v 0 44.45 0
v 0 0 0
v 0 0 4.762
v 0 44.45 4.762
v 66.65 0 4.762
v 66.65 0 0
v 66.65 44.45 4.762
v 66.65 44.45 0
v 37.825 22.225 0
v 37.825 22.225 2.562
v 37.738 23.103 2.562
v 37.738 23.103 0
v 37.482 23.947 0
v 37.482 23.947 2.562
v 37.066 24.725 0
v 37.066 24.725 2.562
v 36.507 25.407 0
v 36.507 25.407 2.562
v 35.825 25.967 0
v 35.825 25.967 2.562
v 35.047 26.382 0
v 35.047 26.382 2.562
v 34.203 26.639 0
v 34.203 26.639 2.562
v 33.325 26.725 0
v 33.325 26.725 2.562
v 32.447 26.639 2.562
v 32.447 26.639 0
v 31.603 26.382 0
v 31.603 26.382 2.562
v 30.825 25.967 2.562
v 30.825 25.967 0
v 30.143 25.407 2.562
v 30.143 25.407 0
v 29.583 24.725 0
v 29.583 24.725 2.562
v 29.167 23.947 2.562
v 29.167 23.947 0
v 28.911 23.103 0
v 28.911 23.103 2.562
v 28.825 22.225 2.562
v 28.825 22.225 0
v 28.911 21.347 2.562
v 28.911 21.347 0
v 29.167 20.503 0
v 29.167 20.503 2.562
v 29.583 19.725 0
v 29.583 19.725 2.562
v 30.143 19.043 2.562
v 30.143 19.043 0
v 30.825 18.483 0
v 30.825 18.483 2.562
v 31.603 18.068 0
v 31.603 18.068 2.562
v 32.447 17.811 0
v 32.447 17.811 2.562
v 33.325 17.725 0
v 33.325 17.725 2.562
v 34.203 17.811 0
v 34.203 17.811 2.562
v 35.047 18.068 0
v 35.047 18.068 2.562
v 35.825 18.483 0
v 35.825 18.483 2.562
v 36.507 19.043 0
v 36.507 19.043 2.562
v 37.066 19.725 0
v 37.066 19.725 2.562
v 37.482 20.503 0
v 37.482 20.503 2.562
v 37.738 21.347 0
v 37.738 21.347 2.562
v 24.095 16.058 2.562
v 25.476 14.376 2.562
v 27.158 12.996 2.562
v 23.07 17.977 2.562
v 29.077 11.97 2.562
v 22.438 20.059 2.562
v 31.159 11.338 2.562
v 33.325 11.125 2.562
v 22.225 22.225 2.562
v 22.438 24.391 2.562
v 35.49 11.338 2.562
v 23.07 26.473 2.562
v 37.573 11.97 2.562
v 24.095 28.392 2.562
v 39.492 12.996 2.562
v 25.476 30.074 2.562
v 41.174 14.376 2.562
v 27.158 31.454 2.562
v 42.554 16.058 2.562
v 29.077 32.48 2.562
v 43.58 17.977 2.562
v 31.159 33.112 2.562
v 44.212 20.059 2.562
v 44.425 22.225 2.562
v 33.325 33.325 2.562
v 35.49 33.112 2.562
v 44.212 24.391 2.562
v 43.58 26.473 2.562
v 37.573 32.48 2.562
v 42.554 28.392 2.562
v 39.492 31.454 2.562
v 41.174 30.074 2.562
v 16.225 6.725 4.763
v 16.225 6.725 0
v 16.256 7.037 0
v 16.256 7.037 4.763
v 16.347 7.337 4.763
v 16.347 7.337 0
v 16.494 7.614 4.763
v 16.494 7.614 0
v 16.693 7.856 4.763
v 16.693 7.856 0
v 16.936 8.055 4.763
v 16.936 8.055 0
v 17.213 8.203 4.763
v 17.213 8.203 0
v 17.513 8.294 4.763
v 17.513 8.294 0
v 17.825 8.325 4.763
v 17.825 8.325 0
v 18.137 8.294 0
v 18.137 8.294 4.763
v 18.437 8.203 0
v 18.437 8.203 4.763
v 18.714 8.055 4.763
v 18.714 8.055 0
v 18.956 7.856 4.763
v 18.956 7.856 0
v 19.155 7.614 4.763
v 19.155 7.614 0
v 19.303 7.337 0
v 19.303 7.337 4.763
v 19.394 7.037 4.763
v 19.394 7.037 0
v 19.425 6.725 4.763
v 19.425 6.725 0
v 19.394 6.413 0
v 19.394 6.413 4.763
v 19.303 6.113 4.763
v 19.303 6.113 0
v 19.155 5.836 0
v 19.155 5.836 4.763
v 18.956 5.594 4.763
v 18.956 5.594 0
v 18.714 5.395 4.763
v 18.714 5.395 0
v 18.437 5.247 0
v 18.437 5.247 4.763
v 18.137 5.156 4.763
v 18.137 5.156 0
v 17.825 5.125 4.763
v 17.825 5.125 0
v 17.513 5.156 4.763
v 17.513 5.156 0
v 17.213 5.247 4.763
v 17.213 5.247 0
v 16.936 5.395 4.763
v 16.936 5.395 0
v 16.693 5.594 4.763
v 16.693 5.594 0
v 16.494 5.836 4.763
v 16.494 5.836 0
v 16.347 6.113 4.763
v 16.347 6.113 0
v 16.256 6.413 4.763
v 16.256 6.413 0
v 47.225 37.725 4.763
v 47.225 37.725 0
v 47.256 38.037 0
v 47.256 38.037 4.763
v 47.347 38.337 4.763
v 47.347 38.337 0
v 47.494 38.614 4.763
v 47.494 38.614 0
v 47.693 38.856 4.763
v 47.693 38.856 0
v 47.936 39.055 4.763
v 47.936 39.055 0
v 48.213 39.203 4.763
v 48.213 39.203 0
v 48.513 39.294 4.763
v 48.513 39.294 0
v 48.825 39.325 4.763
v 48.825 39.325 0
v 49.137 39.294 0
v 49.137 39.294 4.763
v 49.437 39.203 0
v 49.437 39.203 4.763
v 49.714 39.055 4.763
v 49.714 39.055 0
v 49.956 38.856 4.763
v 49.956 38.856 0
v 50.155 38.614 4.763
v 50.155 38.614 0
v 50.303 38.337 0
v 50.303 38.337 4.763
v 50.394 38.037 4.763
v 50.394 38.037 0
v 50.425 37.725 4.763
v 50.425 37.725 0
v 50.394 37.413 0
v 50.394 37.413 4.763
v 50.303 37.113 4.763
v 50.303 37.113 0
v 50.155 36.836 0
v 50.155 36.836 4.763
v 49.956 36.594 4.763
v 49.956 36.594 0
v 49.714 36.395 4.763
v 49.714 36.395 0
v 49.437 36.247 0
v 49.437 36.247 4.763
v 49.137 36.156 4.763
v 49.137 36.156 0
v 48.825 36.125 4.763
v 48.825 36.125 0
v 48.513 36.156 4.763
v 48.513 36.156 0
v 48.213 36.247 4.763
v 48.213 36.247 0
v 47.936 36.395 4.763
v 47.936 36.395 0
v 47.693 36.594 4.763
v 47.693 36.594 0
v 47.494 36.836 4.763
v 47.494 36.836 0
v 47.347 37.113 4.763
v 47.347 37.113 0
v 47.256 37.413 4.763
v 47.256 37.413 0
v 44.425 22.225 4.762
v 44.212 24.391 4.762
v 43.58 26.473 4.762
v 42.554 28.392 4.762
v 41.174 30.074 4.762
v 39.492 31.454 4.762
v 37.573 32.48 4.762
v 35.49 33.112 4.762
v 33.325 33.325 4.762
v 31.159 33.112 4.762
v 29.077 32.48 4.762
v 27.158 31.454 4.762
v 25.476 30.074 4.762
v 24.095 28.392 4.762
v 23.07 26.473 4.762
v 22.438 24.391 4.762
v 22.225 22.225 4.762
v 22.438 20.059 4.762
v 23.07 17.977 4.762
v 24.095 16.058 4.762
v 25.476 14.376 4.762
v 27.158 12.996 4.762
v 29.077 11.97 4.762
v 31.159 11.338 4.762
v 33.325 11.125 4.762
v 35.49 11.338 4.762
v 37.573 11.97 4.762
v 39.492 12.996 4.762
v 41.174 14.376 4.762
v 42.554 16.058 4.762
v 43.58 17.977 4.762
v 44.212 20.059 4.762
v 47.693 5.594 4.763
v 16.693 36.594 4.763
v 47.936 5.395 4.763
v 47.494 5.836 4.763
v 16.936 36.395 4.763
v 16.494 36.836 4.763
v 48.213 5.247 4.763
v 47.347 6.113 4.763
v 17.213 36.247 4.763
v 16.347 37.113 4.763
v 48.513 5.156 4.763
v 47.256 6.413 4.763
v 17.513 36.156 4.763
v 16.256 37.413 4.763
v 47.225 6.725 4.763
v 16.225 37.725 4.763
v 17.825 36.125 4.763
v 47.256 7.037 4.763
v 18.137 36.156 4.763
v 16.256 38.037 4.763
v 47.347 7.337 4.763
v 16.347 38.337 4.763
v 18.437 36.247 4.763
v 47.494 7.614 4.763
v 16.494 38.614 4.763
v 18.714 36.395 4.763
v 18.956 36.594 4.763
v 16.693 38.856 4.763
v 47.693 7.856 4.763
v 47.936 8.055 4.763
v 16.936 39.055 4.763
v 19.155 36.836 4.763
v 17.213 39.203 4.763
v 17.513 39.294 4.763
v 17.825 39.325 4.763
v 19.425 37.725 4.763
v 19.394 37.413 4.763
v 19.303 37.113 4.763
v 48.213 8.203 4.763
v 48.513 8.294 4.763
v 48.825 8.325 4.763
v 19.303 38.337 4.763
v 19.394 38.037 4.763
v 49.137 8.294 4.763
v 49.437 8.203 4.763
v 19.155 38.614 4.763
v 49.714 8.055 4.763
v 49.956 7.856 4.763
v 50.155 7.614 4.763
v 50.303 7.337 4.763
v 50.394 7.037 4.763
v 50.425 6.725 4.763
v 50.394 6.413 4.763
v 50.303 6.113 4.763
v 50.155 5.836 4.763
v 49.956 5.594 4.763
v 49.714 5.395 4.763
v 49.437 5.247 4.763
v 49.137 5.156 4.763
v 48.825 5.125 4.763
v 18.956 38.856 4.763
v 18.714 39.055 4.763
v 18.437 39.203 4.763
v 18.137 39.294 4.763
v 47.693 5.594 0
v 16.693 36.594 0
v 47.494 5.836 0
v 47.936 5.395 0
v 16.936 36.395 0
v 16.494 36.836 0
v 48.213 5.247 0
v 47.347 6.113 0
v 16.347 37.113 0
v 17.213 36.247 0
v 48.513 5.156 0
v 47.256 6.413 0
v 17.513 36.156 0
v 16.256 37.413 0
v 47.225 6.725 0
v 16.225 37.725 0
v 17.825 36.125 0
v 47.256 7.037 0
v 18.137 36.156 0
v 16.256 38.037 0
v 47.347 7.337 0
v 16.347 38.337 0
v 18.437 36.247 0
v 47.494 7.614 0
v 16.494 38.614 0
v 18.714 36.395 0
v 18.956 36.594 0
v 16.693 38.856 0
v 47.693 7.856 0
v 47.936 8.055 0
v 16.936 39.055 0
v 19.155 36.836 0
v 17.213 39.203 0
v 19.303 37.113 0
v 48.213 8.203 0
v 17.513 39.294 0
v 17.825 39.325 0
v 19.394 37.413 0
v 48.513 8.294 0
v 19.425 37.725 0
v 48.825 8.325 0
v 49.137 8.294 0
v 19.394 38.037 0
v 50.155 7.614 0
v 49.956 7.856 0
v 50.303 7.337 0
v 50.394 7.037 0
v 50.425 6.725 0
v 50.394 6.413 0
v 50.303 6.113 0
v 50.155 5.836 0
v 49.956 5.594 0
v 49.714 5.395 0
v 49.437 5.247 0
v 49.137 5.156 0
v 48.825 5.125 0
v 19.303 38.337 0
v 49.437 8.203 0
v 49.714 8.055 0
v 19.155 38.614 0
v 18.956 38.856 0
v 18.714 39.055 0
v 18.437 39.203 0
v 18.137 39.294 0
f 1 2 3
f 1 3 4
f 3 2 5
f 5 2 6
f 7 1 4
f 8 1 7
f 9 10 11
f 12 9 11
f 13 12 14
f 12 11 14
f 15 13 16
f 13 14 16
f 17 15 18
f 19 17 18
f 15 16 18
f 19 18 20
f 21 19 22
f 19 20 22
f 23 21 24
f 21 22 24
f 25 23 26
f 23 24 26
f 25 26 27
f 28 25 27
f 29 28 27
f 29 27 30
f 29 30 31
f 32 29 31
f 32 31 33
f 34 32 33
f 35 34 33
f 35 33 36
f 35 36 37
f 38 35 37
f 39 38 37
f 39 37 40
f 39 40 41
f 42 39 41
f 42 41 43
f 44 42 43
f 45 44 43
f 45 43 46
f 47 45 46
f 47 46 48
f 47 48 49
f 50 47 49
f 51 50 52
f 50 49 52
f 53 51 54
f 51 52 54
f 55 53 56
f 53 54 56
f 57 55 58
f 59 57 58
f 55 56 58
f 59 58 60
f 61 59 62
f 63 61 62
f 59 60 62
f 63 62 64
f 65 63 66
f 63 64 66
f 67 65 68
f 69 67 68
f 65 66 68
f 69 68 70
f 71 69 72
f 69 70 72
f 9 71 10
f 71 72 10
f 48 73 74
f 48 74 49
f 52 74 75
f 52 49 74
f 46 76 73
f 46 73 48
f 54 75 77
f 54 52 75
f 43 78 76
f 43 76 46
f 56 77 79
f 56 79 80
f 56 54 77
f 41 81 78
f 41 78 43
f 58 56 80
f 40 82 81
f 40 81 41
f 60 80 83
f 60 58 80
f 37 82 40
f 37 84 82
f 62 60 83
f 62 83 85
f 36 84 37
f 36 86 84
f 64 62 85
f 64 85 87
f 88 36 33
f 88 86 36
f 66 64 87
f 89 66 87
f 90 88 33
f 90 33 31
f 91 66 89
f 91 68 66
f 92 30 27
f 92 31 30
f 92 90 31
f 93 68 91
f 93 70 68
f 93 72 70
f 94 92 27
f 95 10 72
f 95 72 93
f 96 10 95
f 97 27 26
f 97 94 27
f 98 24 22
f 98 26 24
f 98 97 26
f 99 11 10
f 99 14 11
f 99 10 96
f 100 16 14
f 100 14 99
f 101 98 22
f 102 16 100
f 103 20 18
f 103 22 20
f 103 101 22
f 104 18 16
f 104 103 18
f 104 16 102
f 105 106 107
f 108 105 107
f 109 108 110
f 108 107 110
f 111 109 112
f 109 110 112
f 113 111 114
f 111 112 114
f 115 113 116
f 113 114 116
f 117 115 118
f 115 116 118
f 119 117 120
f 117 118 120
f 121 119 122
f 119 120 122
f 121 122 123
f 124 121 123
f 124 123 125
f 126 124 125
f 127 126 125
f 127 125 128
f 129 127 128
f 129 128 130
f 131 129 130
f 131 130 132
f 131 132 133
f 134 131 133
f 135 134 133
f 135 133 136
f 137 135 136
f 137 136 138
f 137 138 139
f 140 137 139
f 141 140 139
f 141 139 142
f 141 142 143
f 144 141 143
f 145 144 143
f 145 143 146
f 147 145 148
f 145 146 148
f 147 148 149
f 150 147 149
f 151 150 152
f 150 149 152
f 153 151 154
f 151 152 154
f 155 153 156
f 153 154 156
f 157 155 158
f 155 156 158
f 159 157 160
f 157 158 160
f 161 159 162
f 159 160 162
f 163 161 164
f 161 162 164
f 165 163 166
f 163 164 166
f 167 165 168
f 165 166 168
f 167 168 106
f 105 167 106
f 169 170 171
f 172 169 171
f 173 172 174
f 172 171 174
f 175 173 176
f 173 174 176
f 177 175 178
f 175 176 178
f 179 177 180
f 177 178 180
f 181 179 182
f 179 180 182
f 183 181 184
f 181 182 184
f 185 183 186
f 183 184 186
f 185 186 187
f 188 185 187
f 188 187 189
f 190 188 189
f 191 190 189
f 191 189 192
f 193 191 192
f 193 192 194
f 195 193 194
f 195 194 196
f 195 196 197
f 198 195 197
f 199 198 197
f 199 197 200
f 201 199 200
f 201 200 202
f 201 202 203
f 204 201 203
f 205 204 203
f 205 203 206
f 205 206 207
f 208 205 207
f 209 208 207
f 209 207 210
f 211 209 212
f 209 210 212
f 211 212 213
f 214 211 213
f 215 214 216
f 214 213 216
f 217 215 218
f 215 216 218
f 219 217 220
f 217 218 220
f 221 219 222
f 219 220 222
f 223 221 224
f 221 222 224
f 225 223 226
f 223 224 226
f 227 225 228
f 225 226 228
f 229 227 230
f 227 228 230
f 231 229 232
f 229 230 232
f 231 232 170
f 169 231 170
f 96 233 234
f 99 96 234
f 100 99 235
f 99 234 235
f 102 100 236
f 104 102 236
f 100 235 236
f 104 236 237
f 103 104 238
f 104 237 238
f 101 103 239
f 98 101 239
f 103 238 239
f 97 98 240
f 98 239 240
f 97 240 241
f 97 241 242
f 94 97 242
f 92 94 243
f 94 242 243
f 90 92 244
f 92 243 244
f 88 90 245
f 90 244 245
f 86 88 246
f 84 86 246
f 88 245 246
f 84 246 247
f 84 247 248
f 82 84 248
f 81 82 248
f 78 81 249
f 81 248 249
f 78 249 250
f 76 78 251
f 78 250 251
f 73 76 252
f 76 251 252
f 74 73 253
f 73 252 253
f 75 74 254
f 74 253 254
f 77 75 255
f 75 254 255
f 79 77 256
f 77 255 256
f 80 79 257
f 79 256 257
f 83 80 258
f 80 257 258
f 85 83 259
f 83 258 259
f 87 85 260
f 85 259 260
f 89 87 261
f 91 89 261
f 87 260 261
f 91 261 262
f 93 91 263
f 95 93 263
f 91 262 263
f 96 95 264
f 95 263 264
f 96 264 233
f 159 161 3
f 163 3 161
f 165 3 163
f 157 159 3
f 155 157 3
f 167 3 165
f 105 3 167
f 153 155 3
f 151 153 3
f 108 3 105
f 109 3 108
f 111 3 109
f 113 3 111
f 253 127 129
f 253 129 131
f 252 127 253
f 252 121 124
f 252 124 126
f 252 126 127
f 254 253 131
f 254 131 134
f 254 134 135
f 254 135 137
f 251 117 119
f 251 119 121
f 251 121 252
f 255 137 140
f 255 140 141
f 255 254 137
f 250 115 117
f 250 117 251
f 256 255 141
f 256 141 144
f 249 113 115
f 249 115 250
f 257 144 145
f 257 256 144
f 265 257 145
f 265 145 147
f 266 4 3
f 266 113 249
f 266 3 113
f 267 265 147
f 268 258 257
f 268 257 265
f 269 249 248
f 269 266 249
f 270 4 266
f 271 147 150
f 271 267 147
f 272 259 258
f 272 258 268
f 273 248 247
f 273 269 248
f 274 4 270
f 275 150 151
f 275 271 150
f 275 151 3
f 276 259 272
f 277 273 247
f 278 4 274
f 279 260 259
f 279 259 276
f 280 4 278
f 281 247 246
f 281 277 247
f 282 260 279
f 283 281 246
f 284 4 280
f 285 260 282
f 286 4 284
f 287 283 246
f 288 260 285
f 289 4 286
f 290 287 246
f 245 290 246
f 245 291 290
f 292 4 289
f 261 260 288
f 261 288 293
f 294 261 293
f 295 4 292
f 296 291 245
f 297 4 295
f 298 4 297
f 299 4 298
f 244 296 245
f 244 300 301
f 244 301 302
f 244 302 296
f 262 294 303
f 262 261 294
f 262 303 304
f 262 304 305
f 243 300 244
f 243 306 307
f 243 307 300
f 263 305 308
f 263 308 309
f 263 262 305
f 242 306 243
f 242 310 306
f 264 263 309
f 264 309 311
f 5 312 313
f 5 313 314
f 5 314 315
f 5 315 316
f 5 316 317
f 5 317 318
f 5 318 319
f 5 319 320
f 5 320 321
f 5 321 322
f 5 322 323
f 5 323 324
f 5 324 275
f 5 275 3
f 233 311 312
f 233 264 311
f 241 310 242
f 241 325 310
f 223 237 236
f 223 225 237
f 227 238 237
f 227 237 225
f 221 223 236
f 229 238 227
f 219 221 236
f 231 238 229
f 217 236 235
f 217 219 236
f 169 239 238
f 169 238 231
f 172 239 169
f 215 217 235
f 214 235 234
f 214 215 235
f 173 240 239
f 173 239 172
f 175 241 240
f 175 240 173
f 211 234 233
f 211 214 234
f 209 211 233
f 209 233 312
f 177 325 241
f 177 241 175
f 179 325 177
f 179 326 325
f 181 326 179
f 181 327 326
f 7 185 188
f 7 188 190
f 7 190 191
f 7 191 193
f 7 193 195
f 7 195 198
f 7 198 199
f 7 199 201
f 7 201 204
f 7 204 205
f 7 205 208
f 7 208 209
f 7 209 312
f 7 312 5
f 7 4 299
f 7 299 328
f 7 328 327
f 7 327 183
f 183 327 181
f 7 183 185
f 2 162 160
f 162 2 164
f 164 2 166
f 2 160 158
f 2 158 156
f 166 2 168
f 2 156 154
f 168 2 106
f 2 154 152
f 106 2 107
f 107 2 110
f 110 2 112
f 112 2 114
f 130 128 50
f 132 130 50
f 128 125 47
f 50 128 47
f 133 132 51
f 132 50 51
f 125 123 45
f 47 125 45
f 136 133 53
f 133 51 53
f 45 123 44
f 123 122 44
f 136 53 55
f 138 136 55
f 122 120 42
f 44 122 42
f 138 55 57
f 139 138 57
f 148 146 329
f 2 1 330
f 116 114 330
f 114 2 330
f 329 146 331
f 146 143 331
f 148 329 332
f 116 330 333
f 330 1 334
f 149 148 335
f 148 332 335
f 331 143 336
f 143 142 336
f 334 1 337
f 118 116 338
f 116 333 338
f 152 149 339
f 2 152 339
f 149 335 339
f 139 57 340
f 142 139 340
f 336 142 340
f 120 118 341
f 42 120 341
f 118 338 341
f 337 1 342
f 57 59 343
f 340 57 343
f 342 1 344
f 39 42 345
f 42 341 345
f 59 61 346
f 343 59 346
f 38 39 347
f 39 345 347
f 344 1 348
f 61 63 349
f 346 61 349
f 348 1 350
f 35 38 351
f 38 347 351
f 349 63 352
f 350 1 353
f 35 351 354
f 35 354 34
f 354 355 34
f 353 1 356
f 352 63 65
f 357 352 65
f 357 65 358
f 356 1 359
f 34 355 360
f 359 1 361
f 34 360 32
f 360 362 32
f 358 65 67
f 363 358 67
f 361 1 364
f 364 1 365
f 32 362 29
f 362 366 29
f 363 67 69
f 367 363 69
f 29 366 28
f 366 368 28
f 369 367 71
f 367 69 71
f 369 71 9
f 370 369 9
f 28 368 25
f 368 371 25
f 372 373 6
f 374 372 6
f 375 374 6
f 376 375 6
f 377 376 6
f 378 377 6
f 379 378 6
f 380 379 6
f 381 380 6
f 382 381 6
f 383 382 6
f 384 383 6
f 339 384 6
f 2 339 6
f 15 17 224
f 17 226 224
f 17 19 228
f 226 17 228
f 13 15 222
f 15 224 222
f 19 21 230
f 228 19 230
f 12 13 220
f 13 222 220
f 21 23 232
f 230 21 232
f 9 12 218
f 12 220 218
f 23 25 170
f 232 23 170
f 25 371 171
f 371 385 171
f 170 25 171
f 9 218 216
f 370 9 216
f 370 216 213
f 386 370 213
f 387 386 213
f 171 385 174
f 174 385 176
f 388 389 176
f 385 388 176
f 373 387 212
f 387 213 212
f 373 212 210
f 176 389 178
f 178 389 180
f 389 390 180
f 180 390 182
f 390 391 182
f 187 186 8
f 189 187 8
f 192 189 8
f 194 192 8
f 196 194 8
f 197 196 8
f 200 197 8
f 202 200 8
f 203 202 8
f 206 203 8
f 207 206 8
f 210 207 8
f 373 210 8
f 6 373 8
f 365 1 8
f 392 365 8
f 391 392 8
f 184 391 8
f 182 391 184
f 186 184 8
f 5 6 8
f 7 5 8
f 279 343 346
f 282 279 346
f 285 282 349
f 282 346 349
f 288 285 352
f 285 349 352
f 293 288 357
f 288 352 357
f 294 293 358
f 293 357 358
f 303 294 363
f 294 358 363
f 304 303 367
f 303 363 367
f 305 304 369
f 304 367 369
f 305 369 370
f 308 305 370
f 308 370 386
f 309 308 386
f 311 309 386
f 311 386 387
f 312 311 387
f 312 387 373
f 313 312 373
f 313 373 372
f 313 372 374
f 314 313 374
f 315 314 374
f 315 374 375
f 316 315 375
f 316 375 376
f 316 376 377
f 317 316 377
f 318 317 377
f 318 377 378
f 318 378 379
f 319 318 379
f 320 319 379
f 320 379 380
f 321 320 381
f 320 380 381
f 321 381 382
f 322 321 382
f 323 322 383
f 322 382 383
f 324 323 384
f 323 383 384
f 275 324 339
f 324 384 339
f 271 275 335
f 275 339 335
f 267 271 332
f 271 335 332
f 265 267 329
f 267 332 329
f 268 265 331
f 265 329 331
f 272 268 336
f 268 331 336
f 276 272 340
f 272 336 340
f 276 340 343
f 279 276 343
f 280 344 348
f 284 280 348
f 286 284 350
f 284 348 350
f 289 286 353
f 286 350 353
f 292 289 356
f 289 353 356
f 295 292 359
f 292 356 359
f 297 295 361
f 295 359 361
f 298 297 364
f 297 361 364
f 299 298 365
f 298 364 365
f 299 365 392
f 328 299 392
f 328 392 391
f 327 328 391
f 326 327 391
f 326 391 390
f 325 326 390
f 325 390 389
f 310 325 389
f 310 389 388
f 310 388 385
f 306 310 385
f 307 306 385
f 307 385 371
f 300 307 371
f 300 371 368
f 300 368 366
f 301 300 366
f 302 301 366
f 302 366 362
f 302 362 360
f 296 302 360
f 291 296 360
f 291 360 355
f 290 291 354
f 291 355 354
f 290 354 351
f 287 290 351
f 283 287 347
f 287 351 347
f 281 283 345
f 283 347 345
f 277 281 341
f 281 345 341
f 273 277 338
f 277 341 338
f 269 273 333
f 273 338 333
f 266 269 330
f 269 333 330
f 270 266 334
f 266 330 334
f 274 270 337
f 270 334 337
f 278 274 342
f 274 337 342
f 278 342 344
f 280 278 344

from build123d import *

# Parameters (mm, degrees)
SKETCH1_W            = 66.6496
SKETCH1_H            = 44.45
BOSS_EXTRUDE1_DEPTH  = 4.7625
M3_CLEARANCE_HOLE1_D = 3.2
SKETCH6_R            = 11.1
CUT_EXTRUDE1_DEPTH   = 2.2
SKETCH7_R            = 4.5
CUT_EXTRUDE2_DEPTH   = 81.15321632


with BuildPart() as part:
    # Sketch1 → Boss-Extrude1 (new body)
    with BuildSketch(Plane.XY):
        with Locations((33.3248, 22.225)):
            Rectangle(SKETCH1_W, SKETCH1_H)
    extrude(amount=BOSS_EXTRUDE1_DEPTH)

    # M3 Clearance Hole1 (through all)
    with Locations(Plane.XY.offset(4.7625)):
        with Locations((48.8248, 6.725), (48.8248, 37.725), (17.8248, 6.725), (17.8248, 37.725)):
            Hole(M3_CLEARANCE_HOLE1_D / 2)

    # Sketch6 → Cut-Extrude1 (cut)
    with BuildSketch(Plane.XY.offset(4.7625)):
        with Locations((33.3248, 22.225)):
            Circle(SKETCH6_R)
    extrude(amount=-CUT_EXTRUDE1_DEPTH, mode=Mode.SUBTRACT)

    # Sketch7 → Cut-Extrude2 (cut, through all)
    with BuildSketch(Plane.XY.offset(2.5625)):
        with Locations((33.3248, 22.225)):
            Circle(SKETCH7_R)
    extrude(amount=-CUT_EXTRUDE2_DEPTH, mode=Mode.SUBTRACT)


solid = part.part
